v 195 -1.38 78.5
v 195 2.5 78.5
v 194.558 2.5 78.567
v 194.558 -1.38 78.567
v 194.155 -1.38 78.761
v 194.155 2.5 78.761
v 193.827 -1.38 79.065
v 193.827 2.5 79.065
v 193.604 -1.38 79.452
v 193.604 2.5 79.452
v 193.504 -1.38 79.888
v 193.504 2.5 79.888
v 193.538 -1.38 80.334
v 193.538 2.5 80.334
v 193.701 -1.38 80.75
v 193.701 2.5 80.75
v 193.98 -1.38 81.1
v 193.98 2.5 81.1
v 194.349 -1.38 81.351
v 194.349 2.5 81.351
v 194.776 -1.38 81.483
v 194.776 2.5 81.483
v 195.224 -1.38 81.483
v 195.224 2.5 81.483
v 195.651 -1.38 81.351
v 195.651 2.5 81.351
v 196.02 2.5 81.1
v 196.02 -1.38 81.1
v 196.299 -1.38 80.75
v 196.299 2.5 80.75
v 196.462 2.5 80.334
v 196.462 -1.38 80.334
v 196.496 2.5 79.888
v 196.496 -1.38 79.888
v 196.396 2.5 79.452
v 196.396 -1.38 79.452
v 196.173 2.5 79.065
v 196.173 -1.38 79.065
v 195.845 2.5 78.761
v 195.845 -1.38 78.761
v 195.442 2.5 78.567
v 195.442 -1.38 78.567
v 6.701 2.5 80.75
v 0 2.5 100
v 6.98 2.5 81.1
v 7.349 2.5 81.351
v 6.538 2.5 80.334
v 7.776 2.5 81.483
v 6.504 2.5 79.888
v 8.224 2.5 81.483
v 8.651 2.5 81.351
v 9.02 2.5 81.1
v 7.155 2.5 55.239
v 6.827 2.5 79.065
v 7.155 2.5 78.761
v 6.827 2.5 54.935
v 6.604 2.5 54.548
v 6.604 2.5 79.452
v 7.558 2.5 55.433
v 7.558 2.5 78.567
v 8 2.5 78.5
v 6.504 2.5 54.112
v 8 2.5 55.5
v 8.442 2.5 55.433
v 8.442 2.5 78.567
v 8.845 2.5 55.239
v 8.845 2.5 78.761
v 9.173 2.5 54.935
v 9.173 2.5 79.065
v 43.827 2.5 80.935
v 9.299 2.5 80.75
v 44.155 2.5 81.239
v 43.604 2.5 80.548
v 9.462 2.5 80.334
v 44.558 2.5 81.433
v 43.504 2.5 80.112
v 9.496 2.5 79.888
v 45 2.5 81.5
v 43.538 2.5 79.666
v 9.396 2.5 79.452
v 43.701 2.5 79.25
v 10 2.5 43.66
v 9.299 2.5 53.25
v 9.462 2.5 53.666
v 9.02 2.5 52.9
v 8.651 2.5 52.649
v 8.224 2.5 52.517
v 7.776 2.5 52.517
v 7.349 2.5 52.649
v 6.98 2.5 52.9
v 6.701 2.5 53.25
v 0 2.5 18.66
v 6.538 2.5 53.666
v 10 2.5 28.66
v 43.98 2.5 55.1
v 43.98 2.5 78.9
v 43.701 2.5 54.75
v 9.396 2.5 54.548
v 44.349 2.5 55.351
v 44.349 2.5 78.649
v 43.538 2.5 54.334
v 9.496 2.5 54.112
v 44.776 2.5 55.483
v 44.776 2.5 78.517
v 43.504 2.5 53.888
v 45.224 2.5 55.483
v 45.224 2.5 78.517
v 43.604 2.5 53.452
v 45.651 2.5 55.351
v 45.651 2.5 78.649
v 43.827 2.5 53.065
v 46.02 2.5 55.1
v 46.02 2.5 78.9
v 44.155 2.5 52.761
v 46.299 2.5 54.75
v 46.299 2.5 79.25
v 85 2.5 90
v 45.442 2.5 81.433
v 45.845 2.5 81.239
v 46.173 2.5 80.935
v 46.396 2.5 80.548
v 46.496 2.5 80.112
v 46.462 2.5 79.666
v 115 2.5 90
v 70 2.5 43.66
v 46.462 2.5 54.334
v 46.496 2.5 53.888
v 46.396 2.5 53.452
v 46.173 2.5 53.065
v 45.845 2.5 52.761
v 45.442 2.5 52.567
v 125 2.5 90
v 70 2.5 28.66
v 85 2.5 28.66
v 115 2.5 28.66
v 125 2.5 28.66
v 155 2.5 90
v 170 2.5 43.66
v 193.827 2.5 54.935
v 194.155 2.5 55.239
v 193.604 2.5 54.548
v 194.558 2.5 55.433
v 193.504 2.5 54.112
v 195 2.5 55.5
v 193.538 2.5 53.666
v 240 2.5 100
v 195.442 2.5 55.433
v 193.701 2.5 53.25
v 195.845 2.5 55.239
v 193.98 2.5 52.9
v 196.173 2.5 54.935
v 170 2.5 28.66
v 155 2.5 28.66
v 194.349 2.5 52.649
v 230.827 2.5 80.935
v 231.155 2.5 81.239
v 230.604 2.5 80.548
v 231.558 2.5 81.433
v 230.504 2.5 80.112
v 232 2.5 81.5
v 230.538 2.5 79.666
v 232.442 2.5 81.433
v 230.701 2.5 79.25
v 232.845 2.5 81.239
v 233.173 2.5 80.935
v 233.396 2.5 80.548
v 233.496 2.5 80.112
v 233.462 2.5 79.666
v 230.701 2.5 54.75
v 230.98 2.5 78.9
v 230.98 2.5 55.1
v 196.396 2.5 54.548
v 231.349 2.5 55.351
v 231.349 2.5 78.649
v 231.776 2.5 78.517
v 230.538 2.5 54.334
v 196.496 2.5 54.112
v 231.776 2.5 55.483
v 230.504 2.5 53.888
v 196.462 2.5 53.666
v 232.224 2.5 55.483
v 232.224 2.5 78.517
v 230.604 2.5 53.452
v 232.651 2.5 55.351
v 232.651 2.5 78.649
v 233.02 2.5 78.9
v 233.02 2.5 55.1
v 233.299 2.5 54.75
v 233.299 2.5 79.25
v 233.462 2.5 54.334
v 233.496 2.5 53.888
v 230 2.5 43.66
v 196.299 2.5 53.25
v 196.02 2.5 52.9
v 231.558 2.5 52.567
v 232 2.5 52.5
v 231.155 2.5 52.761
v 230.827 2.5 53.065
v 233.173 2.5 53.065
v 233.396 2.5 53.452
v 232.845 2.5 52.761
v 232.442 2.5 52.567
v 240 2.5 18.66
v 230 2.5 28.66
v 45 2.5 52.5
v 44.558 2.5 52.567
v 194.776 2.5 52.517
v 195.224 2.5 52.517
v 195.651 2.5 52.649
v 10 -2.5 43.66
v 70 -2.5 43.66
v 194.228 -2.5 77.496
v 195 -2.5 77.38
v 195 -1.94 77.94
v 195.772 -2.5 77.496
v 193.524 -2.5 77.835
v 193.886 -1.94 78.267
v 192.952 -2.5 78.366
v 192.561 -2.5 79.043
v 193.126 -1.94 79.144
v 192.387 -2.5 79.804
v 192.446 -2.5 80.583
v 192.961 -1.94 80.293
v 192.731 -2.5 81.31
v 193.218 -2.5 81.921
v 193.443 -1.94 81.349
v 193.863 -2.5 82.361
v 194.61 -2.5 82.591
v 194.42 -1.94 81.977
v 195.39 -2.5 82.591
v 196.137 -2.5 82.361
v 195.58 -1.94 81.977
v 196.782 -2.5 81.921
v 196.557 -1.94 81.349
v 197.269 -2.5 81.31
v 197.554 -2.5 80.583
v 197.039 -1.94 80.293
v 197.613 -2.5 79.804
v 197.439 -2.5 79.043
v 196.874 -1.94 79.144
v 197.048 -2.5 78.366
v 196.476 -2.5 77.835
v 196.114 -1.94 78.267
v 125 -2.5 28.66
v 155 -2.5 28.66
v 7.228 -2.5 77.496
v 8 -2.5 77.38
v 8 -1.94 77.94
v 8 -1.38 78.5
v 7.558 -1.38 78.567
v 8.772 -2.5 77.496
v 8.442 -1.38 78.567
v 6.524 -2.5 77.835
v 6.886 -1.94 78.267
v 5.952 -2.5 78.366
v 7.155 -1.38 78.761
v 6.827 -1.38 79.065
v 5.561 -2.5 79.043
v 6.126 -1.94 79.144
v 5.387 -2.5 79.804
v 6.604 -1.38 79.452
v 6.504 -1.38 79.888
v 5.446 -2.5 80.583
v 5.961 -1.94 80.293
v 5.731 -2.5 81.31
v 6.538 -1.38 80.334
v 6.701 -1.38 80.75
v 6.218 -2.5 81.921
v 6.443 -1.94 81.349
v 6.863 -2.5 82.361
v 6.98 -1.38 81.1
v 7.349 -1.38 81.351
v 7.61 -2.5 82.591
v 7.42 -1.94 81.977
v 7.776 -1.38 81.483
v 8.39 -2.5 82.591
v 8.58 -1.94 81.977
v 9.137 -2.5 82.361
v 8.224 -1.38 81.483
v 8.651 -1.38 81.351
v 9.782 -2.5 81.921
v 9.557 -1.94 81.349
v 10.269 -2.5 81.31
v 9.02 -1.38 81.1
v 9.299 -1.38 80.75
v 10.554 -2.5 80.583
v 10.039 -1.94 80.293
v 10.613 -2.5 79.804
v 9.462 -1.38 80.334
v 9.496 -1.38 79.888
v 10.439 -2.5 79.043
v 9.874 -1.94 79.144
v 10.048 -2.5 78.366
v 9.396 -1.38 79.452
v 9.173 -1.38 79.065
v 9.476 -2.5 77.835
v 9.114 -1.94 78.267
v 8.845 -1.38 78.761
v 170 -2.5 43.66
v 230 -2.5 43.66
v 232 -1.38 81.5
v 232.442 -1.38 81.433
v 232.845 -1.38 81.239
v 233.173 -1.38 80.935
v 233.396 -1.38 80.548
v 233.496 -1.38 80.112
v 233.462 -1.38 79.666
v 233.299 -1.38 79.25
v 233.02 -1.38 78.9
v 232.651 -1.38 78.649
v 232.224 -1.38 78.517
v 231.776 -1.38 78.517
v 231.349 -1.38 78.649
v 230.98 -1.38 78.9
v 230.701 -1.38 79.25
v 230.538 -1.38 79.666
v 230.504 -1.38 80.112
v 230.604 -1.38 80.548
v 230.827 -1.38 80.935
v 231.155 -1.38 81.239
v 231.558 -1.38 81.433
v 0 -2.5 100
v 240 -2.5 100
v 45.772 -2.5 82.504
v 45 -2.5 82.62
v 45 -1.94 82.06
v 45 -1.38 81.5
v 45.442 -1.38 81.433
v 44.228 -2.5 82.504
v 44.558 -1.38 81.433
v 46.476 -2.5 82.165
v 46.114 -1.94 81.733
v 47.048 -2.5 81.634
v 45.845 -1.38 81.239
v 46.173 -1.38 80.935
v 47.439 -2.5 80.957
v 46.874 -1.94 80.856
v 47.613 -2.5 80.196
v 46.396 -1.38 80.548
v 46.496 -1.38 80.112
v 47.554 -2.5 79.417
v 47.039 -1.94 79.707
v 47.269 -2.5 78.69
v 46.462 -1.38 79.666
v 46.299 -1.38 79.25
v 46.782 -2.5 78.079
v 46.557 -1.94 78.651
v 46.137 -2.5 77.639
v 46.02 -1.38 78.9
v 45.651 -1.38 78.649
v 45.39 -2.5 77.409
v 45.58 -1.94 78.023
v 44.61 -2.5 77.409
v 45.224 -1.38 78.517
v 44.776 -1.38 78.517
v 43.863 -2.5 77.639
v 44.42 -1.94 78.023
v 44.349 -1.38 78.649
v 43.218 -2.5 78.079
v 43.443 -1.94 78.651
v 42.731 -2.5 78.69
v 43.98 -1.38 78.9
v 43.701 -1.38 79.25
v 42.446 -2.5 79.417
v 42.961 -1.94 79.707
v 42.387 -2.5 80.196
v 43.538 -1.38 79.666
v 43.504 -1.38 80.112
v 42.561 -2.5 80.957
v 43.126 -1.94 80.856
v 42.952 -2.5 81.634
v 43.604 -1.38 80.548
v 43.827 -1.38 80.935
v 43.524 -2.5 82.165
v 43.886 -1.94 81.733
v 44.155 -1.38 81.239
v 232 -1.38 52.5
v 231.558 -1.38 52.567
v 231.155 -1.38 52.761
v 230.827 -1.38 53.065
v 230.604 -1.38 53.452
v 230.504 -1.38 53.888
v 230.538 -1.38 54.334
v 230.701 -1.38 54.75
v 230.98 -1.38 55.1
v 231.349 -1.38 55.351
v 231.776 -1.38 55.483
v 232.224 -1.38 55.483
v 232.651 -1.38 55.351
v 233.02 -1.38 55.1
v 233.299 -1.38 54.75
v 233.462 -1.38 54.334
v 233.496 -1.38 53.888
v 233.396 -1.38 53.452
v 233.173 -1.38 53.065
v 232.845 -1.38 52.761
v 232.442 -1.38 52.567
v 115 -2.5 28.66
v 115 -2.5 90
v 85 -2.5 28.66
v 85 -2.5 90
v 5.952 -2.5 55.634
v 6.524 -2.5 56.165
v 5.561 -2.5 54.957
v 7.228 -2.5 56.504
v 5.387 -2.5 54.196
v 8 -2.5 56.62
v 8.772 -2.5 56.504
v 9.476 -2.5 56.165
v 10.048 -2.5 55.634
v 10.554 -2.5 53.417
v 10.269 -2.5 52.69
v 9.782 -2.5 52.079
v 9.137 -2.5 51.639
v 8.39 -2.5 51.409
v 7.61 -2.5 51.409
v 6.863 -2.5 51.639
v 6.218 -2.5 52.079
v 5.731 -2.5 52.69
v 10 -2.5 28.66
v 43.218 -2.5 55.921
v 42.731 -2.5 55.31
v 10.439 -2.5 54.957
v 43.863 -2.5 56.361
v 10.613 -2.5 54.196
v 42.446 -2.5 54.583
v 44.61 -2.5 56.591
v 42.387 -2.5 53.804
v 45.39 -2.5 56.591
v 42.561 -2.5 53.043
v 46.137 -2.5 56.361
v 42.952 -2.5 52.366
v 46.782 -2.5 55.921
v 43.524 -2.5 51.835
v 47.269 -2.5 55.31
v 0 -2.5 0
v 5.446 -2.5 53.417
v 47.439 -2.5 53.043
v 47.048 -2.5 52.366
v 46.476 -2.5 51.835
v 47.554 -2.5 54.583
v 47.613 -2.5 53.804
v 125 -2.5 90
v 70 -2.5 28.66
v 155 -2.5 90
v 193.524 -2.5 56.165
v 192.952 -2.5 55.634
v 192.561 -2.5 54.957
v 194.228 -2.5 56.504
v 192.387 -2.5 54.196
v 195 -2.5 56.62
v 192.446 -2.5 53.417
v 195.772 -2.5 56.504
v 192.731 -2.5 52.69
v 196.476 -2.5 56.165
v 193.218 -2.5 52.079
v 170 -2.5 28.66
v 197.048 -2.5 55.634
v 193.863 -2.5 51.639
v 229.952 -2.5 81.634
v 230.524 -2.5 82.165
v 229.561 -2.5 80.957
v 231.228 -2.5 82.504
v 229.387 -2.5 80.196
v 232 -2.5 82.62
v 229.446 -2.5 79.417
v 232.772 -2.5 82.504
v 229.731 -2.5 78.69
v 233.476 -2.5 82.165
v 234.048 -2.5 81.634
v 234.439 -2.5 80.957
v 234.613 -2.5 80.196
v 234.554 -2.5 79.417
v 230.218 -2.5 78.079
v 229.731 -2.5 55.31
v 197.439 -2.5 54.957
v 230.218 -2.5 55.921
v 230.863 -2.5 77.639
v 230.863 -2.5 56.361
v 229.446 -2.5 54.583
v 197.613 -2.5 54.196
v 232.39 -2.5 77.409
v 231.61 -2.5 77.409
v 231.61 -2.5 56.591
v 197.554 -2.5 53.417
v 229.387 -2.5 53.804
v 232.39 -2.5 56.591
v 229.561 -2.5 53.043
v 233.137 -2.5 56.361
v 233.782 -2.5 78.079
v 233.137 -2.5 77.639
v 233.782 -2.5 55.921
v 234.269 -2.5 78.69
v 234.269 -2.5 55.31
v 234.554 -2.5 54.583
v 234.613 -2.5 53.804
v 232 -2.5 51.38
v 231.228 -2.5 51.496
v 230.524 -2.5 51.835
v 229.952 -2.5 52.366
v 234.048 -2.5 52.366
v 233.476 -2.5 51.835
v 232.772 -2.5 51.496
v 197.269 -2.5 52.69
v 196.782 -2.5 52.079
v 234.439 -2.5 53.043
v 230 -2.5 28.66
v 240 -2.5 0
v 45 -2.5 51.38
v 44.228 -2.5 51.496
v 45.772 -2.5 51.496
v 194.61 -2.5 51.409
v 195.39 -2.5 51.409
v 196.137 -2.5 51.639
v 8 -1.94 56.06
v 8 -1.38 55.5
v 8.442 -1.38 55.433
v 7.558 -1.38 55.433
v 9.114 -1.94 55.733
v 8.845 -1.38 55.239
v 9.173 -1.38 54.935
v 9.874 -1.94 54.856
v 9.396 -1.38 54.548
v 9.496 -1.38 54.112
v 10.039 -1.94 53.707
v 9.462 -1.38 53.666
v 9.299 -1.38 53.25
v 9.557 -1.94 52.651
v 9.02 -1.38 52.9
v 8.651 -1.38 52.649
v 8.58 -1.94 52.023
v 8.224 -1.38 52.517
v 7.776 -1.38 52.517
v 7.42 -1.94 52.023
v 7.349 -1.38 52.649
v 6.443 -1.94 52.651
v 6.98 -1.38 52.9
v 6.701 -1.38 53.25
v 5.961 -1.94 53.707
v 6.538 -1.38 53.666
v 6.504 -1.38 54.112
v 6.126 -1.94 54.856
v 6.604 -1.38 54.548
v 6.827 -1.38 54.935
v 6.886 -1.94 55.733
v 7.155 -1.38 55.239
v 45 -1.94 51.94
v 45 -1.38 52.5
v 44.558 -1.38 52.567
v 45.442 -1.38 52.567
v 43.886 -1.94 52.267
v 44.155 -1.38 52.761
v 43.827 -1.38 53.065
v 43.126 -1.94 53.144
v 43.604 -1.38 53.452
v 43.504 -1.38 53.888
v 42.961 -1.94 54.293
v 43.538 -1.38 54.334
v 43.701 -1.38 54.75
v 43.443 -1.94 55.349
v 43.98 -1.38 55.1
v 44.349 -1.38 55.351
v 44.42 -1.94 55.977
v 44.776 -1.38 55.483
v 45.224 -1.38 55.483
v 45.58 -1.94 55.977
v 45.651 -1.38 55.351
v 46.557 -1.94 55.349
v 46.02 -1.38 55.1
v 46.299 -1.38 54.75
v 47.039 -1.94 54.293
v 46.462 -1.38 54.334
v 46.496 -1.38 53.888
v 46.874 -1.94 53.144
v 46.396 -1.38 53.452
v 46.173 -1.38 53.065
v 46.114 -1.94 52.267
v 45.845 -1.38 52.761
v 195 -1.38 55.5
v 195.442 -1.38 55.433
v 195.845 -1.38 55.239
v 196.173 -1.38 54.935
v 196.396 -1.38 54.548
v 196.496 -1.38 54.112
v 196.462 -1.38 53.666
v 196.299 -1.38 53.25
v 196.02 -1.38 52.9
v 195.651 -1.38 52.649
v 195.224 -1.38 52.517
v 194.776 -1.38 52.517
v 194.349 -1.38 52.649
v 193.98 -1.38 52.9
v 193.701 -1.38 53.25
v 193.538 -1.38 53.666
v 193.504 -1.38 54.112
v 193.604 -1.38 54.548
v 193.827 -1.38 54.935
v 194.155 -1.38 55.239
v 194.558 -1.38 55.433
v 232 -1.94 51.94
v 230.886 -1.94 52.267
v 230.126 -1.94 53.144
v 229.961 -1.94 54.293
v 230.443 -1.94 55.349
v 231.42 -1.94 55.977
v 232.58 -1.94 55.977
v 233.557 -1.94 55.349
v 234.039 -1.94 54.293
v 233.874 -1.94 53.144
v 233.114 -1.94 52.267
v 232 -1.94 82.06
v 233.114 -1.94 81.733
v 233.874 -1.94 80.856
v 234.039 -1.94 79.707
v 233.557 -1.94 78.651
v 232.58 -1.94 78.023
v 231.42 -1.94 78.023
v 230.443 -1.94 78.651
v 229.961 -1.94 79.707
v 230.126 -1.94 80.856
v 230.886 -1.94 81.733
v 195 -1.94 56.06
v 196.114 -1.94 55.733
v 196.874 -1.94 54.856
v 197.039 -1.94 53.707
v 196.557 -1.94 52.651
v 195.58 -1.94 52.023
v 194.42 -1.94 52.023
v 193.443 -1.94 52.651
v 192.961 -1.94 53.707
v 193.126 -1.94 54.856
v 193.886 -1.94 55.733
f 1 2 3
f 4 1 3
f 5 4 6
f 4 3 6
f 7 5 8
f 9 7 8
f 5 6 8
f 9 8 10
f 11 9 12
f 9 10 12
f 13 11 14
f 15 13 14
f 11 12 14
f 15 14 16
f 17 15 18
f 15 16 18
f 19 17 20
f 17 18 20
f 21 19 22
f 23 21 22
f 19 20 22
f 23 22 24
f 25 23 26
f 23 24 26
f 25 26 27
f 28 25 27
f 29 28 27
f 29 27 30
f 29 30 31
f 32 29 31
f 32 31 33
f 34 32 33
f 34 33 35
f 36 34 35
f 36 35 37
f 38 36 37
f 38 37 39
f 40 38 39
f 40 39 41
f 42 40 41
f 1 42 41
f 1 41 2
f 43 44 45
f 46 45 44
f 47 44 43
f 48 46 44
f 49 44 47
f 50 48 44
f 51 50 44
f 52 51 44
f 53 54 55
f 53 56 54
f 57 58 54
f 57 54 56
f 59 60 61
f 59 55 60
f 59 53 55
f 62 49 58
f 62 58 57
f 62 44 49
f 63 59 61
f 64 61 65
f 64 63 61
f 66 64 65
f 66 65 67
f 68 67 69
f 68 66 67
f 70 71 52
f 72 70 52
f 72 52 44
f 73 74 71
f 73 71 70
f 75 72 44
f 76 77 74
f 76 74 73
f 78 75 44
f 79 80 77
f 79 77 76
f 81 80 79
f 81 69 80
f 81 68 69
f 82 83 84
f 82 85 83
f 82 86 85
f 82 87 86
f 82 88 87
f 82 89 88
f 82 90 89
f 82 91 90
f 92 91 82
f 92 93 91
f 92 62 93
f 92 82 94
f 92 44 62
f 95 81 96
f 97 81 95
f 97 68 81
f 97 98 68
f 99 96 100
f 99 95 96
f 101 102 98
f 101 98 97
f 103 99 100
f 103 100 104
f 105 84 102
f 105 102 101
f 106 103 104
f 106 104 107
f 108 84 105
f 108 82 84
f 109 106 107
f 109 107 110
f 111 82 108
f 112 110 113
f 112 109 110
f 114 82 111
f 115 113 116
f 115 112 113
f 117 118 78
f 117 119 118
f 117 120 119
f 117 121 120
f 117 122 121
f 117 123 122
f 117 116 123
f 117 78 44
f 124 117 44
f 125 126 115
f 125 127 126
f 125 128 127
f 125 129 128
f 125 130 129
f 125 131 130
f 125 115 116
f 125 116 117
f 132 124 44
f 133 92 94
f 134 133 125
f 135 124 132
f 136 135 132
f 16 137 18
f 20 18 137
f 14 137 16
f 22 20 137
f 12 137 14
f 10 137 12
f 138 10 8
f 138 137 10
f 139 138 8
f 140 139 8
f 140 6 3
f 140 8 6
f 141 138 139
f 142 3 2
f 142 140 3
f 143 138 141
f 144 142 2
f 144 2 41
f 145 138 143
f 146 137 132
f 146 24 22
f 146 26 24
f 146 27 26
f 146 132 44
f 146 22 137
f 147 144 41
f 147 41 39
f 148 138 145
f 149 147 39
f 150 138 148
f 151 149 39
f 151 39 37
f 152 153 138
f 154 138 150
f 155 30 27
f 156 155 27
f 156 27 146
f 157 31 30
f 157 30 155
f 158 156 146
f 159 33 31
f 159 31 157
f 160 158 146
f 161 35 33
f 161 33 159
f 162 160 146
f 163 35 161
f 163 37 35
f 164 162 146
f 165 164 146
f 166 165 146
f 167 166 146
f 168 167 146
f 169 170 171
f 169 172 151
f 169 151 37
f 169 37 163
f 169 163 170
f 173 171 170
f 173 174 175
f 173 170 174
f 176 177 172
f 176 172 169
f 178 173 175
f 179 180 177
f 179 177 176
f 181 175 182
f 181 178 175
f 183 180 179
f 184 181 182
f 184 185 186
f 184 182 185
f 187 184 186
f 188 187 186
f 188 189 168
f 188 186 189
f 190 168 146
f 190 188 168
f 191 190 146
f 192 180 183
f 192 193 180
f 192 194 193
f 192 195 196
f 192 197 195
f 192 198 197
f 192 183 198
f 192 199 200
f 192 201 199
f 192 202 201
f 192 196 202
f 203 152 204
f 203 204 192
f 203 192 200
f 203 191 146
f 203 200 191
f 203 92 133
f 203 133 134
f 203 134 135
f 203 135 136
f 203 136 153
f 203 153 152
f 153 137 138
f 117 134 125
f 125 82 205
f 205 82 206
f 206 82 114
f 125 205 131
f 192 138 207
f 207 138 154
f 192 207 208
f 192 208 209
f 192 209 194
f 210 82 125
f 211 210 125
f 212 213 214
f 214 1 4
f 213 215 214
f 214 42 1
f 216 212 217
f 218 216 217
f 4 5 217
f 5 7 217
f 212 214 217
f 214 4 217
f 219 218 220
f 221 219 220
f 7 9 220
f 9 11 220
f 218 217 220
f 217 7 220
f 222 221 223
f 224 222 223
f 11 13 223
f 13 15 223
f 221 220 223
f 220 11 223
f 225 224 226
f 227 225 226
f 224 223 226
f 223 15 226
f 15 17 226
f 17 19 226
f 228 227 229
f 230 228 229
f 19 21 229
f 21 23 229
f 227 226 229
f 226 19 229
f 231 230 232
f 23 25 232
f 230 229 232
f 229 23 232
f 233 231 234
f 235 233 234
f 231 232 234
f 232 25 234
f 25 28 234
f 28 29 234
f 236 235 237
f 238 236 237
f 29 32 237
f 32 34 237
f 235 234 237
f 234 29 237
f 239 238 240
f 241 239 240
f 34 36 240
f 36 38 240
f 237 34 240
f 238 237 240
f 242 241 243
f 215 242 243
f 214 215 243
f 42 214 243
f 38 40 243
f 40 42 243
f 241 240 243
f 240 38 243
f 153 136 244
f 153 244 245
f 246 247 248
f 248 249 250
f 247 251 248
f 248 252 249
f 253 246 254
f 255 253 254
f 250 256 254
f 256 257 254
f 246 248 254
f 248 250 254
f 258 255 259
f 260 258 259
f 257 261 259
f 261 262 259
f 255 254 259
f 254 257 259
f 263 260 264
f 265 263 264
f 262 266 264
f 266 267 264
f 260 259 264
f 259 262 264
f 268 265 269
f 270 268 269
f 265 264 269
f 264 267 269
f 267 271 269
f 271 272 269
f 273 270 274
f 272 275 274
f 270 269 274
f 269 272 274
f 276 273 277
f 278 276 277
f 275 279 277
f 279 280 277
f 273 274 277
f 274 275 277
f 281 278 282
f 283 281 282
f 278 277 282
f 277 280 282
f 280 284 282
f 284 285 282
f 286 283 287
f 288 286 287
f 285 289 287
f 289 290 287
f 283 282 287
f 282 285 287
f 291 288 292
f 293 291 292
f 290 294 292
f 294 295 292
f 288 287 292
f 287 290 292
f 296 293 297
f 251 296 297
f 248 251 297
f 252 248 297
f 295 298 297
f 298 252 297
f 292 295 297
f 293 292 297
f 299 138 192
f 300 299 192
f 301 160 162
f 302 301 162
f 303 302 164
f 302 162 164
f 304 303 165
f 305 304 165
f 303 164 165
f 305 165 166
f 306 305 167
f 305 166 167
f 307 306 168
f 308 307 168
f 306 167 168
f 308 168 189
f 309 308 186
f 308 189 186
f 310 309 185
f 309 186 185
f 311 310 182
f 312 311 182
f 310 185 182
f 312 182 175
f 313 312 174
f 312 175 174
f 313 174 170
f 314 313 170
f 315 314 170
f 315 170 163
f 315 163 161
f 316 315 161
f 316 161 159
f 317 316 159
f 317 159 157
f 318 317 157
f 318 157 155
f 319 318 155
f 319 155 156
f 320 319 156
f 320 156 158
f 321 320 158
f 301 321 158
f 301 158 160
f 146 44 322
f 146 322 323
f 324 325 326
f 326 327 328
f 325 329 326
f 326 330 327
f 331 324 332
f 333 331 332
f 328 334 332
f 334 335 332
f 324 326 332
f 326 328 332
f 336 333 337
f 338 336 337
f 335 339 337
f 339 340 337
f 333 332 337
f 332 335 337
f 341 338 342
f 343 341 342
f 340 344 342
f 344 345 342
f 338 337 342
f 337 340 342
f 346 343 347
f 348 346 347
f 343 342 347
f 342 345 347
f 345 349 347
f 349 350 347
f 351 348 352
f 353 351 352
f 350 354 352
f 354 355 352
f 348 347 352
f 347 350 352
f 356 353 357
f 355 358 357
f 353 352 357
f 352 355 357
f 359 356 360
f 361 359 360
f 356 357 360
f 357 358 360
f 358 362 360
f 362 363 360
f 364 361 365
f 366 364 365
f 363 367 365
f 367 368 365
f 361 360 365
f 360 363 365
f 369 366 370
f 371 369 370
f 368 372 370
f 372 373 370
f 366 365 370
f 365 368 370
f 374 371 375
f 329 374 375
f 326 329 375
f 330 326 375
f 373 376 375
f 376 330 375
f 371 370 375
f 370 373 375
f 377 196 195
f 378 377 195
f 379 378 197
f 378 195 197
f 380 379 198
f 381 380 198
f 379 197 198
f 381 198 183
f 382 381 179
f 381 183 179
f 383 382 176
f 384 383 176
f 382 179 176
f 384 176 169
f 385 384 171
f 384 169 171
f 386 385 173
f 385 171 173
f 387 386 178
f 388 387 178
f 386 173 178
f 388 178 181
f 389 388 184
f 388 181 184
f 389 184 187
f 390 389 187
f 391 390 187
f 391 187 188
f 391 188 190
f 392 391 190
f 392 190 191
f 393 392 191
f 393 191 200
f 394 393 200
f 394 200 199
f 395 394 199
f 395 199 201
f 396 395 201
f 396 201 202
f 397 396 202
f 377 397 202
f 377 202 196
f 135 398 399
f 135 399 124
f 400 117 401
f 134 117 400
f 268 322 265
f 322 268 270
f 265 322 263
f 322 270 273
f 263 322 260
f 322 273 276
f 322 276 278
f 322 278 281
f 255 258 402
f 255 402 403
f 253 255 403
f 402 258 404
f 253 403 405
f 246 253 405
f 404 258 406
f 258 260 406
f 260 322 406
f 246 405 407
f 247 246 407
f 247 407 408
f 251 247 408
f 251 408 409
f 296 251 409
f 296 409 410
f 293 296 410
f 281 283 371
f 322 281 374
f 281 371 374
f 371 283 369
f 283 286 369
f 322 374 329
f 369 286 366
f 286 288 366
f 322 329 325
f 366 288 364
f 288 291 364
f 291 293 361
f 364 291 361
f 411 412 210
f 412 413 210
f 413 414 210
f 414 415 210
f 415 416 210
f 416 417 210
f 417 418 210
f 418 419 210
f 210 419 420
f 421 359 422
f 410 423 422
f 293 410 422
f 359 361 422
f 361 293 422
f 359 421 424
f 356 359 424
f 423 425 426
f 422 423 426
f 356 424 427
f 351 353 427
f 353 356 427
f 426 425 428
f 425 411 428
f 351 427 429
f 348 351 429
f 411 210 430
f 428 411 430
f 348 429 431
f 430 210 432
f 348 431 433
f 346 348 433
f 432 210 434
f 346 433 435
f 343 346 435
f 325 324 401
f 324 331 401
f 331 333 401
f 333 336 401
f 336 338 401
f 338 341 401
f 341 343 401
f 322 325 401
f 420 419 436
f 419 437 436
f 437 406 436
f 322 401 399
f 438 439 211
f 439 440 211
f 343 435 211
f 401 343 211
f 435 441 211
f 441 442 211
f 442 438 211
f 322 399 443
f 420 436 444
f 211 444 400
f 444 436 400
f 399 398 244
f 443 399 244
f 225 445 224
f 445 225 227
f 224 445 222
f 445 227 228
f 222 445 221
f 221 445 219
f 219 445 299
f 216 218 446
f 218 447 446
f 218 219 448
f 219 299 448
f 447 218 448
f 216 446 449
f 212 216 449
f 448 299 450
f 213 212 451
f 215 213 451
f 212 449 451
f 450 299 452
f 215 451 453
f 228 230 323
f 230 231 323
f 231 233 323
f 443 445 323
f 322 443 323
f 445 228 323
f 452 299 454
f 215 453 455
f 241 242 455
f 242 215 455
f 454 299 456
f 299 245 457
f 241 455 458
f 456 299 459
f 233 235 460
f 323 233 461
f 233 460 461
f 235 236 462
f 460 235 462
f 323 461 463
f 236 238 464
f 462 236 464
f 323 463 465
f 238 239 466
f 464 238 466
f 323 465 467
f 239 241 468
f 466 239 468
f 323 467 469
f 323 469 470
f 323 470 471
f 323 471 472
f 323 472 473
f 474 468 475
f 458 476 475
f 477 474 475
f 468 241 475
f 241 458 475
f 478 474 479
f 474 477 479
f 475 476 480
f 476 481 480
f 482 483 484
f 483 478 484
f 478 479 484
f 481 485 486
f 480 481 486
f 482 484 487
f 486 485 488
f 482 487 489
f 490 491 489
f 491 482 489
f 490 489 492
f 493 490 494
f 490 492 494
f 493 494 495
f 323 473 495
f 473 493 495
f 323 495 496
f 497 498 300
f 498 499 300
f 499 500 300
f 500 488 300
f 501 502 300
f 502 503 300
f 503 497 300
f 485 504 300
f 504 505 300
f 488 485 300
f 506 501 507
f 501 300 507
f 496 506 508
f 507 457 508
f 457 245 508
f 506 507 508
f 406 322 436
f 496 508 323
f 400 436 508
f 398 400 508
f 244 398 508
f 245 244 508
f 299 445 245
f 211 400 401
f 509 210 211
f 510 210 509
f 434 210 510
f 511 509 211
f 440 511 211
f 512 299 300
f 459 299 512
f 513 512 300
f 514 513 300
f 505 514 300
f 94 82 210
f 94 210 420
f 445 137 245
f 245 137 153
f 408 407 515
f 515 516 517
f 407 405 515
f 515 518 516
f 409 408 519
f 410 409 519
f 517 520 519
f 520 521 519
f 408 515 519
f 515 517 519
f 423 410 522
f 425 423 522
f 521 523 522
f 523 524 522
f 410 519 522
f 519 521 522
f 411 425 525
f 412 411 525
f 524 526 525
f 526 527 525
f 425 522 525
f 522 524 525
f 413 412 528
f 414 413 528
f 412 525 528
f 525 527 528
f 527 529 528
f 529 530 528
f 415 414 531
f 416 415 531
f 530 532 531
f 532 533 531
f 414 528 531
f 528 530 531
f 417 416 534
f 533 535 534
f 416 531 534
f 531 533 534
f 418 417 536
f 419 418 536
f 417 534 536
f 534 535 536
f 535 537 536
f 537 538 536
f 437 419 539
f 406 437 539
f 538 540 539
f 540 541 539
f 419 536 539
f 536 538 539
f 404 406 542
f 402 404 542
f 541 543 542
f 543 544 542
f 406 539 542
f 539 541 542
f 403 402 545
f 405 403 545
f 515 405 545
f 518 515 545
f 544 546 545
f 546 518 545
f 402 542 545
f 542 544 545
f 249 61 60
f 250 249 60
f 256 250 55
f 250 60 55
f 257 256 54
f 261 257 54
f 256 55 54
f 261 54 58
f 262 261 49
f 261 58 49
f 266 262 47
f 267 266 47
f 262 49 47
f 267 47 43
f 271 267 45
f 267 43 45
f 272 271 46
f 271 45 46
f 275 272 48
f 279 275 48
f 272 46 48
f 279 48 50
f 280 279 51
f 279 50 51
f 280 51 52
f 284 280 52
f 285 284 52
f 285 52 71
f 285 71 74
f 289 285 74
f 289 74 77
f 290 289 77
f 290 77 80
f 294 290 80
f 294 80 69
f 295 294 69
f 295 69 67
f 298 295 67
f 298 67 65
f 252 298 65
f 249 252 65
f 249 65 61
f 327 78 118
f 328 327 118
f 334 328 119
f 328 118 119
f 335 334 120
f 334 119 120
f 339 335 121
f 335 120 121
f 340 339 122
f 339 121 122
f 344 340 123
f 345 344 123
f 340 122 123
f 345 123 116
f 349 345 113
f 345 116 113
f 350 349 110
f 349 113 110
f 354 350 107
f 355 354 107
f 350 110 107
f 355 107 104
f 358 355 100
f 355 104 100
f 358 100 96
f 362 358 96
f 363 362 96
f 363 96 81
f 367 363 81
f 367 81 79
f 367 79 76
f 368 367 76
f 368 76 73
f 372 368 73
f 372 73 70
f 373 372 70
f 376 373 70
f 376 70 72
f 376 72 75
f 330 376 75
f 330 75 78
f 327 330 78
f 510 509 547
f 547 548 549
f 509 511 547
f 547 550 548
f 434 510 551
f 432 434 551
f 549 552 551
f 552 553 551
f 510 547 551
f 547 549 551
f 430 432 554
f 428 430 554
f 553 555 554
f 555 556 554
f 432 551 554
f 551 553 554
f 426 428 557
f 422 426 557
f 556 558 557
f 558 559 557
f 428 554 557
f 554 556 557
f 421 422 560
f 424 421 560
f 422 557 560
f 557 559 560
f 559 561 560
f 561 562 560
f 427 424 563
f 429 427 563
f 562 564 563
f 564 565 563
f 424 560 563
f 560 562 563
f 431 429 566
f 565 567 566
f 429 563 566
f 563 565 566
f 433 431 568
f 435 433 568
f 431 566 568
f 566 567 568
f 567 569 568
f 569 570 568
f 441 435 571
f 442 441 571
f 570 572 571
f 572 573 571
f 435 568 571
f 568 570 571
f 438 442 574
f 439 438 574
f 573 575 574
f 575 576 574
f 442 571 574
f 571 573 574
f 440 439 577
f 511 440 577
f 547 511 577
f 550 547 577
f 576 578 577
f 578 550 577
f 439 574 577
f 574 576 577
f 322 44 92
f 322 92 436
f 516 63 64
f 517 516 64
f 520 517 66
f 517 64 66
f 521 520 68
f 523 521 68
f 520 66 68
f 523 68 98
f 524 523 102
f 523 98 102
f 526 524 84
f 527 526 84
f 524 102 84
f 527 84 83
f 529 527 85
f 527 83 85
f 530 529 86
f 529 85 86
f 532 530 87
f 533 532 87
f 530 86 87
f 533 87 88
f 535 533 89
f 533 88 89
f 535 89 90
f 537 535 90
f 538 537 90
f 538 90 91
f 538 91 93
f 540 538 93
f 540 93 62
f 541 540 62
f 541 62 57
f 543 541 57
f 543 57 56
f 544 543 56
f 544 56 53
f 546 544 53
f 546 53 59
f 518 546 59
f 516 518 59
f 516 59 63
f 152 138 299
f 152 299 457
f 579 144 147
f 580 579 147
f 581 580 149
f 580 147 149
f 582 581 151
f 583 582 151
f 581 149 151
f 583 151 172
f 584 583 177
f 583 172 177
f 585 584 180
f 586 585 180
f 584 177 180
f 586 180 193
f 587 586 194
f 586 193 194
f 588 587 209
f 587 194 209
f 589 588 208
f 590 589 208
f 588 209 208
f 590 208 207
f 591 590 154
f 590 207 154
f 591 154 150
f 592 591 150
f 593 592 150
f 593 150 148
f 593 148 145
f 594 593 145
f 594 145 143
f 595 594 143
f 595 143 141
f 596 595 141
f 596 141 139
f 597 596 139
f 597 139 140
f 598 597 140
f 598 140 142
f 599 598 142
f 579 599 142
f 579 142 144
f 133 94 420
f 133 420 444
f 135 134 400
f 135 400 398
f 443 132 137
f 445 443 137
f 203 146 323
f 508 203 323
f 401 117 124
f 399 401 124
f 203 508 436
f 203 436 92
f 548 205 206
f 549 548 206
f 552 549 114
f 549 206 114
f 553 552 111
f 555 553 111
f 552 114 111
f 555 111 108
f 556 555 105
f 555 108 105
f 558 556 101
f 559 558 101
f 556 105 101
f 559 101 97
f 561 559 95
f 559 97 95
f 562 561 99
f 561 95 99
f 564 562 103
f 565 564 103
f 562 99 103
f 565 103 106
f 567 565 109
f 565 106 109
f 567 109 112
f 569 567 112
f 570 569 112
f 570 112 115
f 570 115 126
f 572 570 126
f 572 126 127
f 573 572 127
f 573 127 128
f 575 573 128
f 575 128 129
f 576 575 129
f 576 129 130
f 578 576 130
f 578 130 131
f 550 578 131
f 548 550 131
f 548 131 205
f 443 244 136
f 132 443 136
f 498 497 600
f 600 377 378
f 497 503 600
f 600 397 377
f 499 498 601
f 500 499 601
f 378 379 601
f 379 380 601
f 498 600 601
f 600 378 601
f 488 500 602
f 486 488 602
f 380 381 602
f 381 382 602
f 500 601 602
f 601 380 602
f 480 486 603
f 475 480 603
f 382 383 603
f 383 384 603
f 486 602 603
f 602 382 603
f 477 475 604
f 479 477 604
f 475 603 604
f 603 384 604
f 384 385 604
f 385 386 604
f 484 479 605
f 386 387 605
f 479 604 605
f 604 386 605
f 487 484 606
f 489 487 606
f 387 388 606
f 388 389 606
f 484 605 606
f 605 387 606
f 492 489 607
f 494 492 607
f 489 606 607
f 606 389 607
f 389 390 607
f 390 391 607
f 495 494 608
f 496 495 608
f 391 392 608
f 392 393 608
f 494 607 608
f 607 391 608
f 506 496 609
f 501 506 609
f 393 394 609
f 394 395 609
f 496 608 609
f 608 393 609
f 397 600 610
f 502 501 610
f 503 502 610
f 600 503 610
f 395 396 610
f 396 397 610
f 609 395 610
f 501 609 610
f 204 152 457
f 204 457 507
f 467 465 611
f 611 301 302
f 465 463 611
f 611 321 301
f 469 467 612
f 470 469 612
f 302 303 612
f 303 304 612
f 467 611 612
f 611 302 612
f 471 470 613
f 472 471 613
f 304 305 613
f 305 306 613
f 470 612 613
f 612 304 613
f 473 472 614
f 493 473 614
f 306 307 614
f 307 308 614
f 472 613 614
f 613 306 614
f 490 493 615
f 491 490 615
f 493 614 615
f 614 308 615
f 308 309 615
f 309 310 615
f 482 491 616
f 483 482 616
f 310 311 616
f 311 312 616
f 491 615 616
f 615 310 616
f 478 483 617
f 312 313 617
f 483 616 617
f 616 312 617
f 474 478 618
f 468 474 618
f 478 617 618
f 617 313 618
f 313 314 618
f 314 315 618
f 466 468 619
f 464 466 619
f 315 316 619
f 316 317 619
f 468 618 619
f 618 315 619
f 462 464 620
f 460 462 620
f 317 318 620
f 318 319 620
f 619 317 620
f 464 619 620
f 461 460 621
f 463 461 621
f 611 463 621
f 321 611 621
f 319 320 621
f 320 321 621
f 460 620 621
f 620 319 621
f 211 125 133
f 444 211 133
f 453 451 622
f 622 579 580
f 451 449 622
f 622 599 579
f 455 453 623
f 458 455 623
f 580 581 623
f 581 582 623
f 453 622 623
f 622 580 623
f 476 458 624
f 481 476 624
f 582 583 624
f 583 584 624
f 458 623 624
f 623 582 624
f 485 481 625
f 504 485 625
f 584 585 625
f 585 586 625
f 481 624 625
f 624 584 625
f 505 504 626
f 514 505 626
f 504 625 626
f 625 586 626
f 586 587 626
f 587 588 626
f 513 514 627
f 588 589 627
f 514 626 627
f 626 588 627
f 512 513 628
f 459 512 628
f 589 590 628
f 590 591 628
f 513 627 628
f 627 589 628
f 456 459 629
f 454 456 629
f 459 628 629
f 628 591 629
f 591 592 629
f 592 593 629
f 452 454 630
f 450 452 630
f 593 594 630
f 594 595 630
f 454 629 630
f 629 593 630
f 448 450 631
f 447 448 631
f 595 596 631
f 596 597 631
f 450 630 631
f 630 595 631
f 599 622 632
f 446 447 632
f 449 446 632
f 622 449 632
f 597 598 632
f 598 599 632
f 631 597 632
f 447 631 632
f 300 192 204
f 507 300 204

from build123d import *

# Parameters (mm, degrees)
SKETCH_1_W          = 240
SKETCH_1_H          = 100
EXTRUDE_1_DEPTH     = 2.5
CUT_EXTRUDE_1_DEPTH = 261.012018953
SKETCH_3_R          = 1.5
CUT_EXTRUDE_2_DEPTH = 261.048072479
SKETCH_5_W          = 70
SKETCH_5_H          = 61.339745962
CUT_EXTRUDE_4_DEPTH = 10
SKETCH_6_W          = 60
SKETCH_6_H          = 15
CUT_EXTRUDE_5_DEPTH = 10
SKETCH_7_W          = 10
SKETCH_7_H          = 5
EXTRUDE_2_DEPTH     = 70
CHAMFER_1_SIZE      = 1.12


with BuildPart() as part:
    # 草图1 → 凸台-拉伸1 (new, symmetric)
    with BuildSketch(Plane(origin=(0, 0, 0), x_dir=(1, 0, 0), z_dir=(0, 1, 0))):
        with Locations((120, -50)):
            Rectangle(SKETCH_1_W, SKETCH_1_H)
    extrude(amount=EXTRUDE_1_DEPTH, both=True)

    # 草图2 → 切除-拉伸1 (cut, through all)
    with BuildSketch(Plane(origin=(240, 0, 0), x_dir=(0, 0, -1), z_dir=(1, 0, 0))):
        Polygon((0, -2.5), (-18.660254038, 2.5), (0, 2.5), align=None)
    extrude(amount=-CUT_EXTRUDE_1_DEPTH, mode=Mode.SUBTRACT)

    # 草图3 → 切除-拉伸2 (cut, through all)
    with BuildSketch(Plane(origin=(0, 2.5, 0), x_dir=(1, 0, 0), z_dir=(0, 1, 0))):
        with Locations(Location((45, -80, 0), (0, 0, 270))):
            Circle(SKETCH_3_R)
        with Locations(Location((45, -54, 0), (0, 0, 90))):
            Circle(SKETCH_3_R)
        with Locations(Location((8, -80, 0), (0, 0, 90))):
            Circle(SKETCH_3_R)
        with Locations(Location((8, -54, 0), (0, 0, 270))):
            Circle(SKETCH_3_R)
        with Locations(Location((195, -80, 0), (0, 0, 90))):
            Circle(SKETCH_3_R)
        with Locations(Location((195, -54, 0), (0, 0, 270))):
            Circle(SKETCH_3_R)
        with Locations(Location((232, -80, 0), (0, 0, 270))):
            Circle(SKETCH_3_R)
        with Locations(Location((232, -54, 0), (0, 0, 90))):
            Circle(SKETCH_3_R)
    extrude(amount=-CUT_EXTRUDE_2_DEPTH, mode=Mode.SUBTRACT)

    # 草图5 → 切除-拉伸4 (cut)
    with BuildSketch(Plane(origin=(0, 2.5, 0), x_dir=(1, 0, 0), z_dir=(0, 1, 0))):
        with Locations((120, -59.330127019)):
            Rectangle(SKETCH_5_W, SKETCH_5_H)
    extrude(amount=-CUT_EXTRUDE_4_DEPTH, mode=Mode.SUBTRACT)

    # 草图6 → 切除-拉伸5 (cut)
    with BuildSketch(Plane(origin=(0, 2.5, 0), x_dir=(1, 0, 0), z_dir=(0, 1, 0))):
        with Locations((40, -36.160254038)):
            Rectangle(SKETCH_6_W, SKETCH_6_H)
        with Locations((200, -36.160254038)):
            Rectangle(SKETCH_6_W, SKETCH_6_H)
    extrude(amount=-CUT_EXTRUDE_5_DEPTH, mode=Mode.SUBTRACT)

    # 草图7 → 凸台-拉伸2 (add)
    with BuildSketch(Plane.XY.offset(28.660254038)):
        with Locations((120, 0)):
            Rectangle(SKETCH_7_W, SKETCH_7_H)
    extrude(amount=EXTRUDE_2_DEPTH)

    # 倒角1
    chamfer_1_edges = [part.edges().sort_by_distance(p)[0] for p in [
        (195, -2.5, 81.5),
        (8, -2.5, 52.5),
        (8, -2.5, 81.5),
        (45, -2.5, 55.5),
        (232, -2.5, 55.5),
        (232, -2.5, 78.5),
        (195, -2.5, 52.5),
        (45, -2.5, 78.5),
    ]]
    chamfer(chamfer_1_edges, length=CHAMFER_1_SIZE)


solid = part.part
